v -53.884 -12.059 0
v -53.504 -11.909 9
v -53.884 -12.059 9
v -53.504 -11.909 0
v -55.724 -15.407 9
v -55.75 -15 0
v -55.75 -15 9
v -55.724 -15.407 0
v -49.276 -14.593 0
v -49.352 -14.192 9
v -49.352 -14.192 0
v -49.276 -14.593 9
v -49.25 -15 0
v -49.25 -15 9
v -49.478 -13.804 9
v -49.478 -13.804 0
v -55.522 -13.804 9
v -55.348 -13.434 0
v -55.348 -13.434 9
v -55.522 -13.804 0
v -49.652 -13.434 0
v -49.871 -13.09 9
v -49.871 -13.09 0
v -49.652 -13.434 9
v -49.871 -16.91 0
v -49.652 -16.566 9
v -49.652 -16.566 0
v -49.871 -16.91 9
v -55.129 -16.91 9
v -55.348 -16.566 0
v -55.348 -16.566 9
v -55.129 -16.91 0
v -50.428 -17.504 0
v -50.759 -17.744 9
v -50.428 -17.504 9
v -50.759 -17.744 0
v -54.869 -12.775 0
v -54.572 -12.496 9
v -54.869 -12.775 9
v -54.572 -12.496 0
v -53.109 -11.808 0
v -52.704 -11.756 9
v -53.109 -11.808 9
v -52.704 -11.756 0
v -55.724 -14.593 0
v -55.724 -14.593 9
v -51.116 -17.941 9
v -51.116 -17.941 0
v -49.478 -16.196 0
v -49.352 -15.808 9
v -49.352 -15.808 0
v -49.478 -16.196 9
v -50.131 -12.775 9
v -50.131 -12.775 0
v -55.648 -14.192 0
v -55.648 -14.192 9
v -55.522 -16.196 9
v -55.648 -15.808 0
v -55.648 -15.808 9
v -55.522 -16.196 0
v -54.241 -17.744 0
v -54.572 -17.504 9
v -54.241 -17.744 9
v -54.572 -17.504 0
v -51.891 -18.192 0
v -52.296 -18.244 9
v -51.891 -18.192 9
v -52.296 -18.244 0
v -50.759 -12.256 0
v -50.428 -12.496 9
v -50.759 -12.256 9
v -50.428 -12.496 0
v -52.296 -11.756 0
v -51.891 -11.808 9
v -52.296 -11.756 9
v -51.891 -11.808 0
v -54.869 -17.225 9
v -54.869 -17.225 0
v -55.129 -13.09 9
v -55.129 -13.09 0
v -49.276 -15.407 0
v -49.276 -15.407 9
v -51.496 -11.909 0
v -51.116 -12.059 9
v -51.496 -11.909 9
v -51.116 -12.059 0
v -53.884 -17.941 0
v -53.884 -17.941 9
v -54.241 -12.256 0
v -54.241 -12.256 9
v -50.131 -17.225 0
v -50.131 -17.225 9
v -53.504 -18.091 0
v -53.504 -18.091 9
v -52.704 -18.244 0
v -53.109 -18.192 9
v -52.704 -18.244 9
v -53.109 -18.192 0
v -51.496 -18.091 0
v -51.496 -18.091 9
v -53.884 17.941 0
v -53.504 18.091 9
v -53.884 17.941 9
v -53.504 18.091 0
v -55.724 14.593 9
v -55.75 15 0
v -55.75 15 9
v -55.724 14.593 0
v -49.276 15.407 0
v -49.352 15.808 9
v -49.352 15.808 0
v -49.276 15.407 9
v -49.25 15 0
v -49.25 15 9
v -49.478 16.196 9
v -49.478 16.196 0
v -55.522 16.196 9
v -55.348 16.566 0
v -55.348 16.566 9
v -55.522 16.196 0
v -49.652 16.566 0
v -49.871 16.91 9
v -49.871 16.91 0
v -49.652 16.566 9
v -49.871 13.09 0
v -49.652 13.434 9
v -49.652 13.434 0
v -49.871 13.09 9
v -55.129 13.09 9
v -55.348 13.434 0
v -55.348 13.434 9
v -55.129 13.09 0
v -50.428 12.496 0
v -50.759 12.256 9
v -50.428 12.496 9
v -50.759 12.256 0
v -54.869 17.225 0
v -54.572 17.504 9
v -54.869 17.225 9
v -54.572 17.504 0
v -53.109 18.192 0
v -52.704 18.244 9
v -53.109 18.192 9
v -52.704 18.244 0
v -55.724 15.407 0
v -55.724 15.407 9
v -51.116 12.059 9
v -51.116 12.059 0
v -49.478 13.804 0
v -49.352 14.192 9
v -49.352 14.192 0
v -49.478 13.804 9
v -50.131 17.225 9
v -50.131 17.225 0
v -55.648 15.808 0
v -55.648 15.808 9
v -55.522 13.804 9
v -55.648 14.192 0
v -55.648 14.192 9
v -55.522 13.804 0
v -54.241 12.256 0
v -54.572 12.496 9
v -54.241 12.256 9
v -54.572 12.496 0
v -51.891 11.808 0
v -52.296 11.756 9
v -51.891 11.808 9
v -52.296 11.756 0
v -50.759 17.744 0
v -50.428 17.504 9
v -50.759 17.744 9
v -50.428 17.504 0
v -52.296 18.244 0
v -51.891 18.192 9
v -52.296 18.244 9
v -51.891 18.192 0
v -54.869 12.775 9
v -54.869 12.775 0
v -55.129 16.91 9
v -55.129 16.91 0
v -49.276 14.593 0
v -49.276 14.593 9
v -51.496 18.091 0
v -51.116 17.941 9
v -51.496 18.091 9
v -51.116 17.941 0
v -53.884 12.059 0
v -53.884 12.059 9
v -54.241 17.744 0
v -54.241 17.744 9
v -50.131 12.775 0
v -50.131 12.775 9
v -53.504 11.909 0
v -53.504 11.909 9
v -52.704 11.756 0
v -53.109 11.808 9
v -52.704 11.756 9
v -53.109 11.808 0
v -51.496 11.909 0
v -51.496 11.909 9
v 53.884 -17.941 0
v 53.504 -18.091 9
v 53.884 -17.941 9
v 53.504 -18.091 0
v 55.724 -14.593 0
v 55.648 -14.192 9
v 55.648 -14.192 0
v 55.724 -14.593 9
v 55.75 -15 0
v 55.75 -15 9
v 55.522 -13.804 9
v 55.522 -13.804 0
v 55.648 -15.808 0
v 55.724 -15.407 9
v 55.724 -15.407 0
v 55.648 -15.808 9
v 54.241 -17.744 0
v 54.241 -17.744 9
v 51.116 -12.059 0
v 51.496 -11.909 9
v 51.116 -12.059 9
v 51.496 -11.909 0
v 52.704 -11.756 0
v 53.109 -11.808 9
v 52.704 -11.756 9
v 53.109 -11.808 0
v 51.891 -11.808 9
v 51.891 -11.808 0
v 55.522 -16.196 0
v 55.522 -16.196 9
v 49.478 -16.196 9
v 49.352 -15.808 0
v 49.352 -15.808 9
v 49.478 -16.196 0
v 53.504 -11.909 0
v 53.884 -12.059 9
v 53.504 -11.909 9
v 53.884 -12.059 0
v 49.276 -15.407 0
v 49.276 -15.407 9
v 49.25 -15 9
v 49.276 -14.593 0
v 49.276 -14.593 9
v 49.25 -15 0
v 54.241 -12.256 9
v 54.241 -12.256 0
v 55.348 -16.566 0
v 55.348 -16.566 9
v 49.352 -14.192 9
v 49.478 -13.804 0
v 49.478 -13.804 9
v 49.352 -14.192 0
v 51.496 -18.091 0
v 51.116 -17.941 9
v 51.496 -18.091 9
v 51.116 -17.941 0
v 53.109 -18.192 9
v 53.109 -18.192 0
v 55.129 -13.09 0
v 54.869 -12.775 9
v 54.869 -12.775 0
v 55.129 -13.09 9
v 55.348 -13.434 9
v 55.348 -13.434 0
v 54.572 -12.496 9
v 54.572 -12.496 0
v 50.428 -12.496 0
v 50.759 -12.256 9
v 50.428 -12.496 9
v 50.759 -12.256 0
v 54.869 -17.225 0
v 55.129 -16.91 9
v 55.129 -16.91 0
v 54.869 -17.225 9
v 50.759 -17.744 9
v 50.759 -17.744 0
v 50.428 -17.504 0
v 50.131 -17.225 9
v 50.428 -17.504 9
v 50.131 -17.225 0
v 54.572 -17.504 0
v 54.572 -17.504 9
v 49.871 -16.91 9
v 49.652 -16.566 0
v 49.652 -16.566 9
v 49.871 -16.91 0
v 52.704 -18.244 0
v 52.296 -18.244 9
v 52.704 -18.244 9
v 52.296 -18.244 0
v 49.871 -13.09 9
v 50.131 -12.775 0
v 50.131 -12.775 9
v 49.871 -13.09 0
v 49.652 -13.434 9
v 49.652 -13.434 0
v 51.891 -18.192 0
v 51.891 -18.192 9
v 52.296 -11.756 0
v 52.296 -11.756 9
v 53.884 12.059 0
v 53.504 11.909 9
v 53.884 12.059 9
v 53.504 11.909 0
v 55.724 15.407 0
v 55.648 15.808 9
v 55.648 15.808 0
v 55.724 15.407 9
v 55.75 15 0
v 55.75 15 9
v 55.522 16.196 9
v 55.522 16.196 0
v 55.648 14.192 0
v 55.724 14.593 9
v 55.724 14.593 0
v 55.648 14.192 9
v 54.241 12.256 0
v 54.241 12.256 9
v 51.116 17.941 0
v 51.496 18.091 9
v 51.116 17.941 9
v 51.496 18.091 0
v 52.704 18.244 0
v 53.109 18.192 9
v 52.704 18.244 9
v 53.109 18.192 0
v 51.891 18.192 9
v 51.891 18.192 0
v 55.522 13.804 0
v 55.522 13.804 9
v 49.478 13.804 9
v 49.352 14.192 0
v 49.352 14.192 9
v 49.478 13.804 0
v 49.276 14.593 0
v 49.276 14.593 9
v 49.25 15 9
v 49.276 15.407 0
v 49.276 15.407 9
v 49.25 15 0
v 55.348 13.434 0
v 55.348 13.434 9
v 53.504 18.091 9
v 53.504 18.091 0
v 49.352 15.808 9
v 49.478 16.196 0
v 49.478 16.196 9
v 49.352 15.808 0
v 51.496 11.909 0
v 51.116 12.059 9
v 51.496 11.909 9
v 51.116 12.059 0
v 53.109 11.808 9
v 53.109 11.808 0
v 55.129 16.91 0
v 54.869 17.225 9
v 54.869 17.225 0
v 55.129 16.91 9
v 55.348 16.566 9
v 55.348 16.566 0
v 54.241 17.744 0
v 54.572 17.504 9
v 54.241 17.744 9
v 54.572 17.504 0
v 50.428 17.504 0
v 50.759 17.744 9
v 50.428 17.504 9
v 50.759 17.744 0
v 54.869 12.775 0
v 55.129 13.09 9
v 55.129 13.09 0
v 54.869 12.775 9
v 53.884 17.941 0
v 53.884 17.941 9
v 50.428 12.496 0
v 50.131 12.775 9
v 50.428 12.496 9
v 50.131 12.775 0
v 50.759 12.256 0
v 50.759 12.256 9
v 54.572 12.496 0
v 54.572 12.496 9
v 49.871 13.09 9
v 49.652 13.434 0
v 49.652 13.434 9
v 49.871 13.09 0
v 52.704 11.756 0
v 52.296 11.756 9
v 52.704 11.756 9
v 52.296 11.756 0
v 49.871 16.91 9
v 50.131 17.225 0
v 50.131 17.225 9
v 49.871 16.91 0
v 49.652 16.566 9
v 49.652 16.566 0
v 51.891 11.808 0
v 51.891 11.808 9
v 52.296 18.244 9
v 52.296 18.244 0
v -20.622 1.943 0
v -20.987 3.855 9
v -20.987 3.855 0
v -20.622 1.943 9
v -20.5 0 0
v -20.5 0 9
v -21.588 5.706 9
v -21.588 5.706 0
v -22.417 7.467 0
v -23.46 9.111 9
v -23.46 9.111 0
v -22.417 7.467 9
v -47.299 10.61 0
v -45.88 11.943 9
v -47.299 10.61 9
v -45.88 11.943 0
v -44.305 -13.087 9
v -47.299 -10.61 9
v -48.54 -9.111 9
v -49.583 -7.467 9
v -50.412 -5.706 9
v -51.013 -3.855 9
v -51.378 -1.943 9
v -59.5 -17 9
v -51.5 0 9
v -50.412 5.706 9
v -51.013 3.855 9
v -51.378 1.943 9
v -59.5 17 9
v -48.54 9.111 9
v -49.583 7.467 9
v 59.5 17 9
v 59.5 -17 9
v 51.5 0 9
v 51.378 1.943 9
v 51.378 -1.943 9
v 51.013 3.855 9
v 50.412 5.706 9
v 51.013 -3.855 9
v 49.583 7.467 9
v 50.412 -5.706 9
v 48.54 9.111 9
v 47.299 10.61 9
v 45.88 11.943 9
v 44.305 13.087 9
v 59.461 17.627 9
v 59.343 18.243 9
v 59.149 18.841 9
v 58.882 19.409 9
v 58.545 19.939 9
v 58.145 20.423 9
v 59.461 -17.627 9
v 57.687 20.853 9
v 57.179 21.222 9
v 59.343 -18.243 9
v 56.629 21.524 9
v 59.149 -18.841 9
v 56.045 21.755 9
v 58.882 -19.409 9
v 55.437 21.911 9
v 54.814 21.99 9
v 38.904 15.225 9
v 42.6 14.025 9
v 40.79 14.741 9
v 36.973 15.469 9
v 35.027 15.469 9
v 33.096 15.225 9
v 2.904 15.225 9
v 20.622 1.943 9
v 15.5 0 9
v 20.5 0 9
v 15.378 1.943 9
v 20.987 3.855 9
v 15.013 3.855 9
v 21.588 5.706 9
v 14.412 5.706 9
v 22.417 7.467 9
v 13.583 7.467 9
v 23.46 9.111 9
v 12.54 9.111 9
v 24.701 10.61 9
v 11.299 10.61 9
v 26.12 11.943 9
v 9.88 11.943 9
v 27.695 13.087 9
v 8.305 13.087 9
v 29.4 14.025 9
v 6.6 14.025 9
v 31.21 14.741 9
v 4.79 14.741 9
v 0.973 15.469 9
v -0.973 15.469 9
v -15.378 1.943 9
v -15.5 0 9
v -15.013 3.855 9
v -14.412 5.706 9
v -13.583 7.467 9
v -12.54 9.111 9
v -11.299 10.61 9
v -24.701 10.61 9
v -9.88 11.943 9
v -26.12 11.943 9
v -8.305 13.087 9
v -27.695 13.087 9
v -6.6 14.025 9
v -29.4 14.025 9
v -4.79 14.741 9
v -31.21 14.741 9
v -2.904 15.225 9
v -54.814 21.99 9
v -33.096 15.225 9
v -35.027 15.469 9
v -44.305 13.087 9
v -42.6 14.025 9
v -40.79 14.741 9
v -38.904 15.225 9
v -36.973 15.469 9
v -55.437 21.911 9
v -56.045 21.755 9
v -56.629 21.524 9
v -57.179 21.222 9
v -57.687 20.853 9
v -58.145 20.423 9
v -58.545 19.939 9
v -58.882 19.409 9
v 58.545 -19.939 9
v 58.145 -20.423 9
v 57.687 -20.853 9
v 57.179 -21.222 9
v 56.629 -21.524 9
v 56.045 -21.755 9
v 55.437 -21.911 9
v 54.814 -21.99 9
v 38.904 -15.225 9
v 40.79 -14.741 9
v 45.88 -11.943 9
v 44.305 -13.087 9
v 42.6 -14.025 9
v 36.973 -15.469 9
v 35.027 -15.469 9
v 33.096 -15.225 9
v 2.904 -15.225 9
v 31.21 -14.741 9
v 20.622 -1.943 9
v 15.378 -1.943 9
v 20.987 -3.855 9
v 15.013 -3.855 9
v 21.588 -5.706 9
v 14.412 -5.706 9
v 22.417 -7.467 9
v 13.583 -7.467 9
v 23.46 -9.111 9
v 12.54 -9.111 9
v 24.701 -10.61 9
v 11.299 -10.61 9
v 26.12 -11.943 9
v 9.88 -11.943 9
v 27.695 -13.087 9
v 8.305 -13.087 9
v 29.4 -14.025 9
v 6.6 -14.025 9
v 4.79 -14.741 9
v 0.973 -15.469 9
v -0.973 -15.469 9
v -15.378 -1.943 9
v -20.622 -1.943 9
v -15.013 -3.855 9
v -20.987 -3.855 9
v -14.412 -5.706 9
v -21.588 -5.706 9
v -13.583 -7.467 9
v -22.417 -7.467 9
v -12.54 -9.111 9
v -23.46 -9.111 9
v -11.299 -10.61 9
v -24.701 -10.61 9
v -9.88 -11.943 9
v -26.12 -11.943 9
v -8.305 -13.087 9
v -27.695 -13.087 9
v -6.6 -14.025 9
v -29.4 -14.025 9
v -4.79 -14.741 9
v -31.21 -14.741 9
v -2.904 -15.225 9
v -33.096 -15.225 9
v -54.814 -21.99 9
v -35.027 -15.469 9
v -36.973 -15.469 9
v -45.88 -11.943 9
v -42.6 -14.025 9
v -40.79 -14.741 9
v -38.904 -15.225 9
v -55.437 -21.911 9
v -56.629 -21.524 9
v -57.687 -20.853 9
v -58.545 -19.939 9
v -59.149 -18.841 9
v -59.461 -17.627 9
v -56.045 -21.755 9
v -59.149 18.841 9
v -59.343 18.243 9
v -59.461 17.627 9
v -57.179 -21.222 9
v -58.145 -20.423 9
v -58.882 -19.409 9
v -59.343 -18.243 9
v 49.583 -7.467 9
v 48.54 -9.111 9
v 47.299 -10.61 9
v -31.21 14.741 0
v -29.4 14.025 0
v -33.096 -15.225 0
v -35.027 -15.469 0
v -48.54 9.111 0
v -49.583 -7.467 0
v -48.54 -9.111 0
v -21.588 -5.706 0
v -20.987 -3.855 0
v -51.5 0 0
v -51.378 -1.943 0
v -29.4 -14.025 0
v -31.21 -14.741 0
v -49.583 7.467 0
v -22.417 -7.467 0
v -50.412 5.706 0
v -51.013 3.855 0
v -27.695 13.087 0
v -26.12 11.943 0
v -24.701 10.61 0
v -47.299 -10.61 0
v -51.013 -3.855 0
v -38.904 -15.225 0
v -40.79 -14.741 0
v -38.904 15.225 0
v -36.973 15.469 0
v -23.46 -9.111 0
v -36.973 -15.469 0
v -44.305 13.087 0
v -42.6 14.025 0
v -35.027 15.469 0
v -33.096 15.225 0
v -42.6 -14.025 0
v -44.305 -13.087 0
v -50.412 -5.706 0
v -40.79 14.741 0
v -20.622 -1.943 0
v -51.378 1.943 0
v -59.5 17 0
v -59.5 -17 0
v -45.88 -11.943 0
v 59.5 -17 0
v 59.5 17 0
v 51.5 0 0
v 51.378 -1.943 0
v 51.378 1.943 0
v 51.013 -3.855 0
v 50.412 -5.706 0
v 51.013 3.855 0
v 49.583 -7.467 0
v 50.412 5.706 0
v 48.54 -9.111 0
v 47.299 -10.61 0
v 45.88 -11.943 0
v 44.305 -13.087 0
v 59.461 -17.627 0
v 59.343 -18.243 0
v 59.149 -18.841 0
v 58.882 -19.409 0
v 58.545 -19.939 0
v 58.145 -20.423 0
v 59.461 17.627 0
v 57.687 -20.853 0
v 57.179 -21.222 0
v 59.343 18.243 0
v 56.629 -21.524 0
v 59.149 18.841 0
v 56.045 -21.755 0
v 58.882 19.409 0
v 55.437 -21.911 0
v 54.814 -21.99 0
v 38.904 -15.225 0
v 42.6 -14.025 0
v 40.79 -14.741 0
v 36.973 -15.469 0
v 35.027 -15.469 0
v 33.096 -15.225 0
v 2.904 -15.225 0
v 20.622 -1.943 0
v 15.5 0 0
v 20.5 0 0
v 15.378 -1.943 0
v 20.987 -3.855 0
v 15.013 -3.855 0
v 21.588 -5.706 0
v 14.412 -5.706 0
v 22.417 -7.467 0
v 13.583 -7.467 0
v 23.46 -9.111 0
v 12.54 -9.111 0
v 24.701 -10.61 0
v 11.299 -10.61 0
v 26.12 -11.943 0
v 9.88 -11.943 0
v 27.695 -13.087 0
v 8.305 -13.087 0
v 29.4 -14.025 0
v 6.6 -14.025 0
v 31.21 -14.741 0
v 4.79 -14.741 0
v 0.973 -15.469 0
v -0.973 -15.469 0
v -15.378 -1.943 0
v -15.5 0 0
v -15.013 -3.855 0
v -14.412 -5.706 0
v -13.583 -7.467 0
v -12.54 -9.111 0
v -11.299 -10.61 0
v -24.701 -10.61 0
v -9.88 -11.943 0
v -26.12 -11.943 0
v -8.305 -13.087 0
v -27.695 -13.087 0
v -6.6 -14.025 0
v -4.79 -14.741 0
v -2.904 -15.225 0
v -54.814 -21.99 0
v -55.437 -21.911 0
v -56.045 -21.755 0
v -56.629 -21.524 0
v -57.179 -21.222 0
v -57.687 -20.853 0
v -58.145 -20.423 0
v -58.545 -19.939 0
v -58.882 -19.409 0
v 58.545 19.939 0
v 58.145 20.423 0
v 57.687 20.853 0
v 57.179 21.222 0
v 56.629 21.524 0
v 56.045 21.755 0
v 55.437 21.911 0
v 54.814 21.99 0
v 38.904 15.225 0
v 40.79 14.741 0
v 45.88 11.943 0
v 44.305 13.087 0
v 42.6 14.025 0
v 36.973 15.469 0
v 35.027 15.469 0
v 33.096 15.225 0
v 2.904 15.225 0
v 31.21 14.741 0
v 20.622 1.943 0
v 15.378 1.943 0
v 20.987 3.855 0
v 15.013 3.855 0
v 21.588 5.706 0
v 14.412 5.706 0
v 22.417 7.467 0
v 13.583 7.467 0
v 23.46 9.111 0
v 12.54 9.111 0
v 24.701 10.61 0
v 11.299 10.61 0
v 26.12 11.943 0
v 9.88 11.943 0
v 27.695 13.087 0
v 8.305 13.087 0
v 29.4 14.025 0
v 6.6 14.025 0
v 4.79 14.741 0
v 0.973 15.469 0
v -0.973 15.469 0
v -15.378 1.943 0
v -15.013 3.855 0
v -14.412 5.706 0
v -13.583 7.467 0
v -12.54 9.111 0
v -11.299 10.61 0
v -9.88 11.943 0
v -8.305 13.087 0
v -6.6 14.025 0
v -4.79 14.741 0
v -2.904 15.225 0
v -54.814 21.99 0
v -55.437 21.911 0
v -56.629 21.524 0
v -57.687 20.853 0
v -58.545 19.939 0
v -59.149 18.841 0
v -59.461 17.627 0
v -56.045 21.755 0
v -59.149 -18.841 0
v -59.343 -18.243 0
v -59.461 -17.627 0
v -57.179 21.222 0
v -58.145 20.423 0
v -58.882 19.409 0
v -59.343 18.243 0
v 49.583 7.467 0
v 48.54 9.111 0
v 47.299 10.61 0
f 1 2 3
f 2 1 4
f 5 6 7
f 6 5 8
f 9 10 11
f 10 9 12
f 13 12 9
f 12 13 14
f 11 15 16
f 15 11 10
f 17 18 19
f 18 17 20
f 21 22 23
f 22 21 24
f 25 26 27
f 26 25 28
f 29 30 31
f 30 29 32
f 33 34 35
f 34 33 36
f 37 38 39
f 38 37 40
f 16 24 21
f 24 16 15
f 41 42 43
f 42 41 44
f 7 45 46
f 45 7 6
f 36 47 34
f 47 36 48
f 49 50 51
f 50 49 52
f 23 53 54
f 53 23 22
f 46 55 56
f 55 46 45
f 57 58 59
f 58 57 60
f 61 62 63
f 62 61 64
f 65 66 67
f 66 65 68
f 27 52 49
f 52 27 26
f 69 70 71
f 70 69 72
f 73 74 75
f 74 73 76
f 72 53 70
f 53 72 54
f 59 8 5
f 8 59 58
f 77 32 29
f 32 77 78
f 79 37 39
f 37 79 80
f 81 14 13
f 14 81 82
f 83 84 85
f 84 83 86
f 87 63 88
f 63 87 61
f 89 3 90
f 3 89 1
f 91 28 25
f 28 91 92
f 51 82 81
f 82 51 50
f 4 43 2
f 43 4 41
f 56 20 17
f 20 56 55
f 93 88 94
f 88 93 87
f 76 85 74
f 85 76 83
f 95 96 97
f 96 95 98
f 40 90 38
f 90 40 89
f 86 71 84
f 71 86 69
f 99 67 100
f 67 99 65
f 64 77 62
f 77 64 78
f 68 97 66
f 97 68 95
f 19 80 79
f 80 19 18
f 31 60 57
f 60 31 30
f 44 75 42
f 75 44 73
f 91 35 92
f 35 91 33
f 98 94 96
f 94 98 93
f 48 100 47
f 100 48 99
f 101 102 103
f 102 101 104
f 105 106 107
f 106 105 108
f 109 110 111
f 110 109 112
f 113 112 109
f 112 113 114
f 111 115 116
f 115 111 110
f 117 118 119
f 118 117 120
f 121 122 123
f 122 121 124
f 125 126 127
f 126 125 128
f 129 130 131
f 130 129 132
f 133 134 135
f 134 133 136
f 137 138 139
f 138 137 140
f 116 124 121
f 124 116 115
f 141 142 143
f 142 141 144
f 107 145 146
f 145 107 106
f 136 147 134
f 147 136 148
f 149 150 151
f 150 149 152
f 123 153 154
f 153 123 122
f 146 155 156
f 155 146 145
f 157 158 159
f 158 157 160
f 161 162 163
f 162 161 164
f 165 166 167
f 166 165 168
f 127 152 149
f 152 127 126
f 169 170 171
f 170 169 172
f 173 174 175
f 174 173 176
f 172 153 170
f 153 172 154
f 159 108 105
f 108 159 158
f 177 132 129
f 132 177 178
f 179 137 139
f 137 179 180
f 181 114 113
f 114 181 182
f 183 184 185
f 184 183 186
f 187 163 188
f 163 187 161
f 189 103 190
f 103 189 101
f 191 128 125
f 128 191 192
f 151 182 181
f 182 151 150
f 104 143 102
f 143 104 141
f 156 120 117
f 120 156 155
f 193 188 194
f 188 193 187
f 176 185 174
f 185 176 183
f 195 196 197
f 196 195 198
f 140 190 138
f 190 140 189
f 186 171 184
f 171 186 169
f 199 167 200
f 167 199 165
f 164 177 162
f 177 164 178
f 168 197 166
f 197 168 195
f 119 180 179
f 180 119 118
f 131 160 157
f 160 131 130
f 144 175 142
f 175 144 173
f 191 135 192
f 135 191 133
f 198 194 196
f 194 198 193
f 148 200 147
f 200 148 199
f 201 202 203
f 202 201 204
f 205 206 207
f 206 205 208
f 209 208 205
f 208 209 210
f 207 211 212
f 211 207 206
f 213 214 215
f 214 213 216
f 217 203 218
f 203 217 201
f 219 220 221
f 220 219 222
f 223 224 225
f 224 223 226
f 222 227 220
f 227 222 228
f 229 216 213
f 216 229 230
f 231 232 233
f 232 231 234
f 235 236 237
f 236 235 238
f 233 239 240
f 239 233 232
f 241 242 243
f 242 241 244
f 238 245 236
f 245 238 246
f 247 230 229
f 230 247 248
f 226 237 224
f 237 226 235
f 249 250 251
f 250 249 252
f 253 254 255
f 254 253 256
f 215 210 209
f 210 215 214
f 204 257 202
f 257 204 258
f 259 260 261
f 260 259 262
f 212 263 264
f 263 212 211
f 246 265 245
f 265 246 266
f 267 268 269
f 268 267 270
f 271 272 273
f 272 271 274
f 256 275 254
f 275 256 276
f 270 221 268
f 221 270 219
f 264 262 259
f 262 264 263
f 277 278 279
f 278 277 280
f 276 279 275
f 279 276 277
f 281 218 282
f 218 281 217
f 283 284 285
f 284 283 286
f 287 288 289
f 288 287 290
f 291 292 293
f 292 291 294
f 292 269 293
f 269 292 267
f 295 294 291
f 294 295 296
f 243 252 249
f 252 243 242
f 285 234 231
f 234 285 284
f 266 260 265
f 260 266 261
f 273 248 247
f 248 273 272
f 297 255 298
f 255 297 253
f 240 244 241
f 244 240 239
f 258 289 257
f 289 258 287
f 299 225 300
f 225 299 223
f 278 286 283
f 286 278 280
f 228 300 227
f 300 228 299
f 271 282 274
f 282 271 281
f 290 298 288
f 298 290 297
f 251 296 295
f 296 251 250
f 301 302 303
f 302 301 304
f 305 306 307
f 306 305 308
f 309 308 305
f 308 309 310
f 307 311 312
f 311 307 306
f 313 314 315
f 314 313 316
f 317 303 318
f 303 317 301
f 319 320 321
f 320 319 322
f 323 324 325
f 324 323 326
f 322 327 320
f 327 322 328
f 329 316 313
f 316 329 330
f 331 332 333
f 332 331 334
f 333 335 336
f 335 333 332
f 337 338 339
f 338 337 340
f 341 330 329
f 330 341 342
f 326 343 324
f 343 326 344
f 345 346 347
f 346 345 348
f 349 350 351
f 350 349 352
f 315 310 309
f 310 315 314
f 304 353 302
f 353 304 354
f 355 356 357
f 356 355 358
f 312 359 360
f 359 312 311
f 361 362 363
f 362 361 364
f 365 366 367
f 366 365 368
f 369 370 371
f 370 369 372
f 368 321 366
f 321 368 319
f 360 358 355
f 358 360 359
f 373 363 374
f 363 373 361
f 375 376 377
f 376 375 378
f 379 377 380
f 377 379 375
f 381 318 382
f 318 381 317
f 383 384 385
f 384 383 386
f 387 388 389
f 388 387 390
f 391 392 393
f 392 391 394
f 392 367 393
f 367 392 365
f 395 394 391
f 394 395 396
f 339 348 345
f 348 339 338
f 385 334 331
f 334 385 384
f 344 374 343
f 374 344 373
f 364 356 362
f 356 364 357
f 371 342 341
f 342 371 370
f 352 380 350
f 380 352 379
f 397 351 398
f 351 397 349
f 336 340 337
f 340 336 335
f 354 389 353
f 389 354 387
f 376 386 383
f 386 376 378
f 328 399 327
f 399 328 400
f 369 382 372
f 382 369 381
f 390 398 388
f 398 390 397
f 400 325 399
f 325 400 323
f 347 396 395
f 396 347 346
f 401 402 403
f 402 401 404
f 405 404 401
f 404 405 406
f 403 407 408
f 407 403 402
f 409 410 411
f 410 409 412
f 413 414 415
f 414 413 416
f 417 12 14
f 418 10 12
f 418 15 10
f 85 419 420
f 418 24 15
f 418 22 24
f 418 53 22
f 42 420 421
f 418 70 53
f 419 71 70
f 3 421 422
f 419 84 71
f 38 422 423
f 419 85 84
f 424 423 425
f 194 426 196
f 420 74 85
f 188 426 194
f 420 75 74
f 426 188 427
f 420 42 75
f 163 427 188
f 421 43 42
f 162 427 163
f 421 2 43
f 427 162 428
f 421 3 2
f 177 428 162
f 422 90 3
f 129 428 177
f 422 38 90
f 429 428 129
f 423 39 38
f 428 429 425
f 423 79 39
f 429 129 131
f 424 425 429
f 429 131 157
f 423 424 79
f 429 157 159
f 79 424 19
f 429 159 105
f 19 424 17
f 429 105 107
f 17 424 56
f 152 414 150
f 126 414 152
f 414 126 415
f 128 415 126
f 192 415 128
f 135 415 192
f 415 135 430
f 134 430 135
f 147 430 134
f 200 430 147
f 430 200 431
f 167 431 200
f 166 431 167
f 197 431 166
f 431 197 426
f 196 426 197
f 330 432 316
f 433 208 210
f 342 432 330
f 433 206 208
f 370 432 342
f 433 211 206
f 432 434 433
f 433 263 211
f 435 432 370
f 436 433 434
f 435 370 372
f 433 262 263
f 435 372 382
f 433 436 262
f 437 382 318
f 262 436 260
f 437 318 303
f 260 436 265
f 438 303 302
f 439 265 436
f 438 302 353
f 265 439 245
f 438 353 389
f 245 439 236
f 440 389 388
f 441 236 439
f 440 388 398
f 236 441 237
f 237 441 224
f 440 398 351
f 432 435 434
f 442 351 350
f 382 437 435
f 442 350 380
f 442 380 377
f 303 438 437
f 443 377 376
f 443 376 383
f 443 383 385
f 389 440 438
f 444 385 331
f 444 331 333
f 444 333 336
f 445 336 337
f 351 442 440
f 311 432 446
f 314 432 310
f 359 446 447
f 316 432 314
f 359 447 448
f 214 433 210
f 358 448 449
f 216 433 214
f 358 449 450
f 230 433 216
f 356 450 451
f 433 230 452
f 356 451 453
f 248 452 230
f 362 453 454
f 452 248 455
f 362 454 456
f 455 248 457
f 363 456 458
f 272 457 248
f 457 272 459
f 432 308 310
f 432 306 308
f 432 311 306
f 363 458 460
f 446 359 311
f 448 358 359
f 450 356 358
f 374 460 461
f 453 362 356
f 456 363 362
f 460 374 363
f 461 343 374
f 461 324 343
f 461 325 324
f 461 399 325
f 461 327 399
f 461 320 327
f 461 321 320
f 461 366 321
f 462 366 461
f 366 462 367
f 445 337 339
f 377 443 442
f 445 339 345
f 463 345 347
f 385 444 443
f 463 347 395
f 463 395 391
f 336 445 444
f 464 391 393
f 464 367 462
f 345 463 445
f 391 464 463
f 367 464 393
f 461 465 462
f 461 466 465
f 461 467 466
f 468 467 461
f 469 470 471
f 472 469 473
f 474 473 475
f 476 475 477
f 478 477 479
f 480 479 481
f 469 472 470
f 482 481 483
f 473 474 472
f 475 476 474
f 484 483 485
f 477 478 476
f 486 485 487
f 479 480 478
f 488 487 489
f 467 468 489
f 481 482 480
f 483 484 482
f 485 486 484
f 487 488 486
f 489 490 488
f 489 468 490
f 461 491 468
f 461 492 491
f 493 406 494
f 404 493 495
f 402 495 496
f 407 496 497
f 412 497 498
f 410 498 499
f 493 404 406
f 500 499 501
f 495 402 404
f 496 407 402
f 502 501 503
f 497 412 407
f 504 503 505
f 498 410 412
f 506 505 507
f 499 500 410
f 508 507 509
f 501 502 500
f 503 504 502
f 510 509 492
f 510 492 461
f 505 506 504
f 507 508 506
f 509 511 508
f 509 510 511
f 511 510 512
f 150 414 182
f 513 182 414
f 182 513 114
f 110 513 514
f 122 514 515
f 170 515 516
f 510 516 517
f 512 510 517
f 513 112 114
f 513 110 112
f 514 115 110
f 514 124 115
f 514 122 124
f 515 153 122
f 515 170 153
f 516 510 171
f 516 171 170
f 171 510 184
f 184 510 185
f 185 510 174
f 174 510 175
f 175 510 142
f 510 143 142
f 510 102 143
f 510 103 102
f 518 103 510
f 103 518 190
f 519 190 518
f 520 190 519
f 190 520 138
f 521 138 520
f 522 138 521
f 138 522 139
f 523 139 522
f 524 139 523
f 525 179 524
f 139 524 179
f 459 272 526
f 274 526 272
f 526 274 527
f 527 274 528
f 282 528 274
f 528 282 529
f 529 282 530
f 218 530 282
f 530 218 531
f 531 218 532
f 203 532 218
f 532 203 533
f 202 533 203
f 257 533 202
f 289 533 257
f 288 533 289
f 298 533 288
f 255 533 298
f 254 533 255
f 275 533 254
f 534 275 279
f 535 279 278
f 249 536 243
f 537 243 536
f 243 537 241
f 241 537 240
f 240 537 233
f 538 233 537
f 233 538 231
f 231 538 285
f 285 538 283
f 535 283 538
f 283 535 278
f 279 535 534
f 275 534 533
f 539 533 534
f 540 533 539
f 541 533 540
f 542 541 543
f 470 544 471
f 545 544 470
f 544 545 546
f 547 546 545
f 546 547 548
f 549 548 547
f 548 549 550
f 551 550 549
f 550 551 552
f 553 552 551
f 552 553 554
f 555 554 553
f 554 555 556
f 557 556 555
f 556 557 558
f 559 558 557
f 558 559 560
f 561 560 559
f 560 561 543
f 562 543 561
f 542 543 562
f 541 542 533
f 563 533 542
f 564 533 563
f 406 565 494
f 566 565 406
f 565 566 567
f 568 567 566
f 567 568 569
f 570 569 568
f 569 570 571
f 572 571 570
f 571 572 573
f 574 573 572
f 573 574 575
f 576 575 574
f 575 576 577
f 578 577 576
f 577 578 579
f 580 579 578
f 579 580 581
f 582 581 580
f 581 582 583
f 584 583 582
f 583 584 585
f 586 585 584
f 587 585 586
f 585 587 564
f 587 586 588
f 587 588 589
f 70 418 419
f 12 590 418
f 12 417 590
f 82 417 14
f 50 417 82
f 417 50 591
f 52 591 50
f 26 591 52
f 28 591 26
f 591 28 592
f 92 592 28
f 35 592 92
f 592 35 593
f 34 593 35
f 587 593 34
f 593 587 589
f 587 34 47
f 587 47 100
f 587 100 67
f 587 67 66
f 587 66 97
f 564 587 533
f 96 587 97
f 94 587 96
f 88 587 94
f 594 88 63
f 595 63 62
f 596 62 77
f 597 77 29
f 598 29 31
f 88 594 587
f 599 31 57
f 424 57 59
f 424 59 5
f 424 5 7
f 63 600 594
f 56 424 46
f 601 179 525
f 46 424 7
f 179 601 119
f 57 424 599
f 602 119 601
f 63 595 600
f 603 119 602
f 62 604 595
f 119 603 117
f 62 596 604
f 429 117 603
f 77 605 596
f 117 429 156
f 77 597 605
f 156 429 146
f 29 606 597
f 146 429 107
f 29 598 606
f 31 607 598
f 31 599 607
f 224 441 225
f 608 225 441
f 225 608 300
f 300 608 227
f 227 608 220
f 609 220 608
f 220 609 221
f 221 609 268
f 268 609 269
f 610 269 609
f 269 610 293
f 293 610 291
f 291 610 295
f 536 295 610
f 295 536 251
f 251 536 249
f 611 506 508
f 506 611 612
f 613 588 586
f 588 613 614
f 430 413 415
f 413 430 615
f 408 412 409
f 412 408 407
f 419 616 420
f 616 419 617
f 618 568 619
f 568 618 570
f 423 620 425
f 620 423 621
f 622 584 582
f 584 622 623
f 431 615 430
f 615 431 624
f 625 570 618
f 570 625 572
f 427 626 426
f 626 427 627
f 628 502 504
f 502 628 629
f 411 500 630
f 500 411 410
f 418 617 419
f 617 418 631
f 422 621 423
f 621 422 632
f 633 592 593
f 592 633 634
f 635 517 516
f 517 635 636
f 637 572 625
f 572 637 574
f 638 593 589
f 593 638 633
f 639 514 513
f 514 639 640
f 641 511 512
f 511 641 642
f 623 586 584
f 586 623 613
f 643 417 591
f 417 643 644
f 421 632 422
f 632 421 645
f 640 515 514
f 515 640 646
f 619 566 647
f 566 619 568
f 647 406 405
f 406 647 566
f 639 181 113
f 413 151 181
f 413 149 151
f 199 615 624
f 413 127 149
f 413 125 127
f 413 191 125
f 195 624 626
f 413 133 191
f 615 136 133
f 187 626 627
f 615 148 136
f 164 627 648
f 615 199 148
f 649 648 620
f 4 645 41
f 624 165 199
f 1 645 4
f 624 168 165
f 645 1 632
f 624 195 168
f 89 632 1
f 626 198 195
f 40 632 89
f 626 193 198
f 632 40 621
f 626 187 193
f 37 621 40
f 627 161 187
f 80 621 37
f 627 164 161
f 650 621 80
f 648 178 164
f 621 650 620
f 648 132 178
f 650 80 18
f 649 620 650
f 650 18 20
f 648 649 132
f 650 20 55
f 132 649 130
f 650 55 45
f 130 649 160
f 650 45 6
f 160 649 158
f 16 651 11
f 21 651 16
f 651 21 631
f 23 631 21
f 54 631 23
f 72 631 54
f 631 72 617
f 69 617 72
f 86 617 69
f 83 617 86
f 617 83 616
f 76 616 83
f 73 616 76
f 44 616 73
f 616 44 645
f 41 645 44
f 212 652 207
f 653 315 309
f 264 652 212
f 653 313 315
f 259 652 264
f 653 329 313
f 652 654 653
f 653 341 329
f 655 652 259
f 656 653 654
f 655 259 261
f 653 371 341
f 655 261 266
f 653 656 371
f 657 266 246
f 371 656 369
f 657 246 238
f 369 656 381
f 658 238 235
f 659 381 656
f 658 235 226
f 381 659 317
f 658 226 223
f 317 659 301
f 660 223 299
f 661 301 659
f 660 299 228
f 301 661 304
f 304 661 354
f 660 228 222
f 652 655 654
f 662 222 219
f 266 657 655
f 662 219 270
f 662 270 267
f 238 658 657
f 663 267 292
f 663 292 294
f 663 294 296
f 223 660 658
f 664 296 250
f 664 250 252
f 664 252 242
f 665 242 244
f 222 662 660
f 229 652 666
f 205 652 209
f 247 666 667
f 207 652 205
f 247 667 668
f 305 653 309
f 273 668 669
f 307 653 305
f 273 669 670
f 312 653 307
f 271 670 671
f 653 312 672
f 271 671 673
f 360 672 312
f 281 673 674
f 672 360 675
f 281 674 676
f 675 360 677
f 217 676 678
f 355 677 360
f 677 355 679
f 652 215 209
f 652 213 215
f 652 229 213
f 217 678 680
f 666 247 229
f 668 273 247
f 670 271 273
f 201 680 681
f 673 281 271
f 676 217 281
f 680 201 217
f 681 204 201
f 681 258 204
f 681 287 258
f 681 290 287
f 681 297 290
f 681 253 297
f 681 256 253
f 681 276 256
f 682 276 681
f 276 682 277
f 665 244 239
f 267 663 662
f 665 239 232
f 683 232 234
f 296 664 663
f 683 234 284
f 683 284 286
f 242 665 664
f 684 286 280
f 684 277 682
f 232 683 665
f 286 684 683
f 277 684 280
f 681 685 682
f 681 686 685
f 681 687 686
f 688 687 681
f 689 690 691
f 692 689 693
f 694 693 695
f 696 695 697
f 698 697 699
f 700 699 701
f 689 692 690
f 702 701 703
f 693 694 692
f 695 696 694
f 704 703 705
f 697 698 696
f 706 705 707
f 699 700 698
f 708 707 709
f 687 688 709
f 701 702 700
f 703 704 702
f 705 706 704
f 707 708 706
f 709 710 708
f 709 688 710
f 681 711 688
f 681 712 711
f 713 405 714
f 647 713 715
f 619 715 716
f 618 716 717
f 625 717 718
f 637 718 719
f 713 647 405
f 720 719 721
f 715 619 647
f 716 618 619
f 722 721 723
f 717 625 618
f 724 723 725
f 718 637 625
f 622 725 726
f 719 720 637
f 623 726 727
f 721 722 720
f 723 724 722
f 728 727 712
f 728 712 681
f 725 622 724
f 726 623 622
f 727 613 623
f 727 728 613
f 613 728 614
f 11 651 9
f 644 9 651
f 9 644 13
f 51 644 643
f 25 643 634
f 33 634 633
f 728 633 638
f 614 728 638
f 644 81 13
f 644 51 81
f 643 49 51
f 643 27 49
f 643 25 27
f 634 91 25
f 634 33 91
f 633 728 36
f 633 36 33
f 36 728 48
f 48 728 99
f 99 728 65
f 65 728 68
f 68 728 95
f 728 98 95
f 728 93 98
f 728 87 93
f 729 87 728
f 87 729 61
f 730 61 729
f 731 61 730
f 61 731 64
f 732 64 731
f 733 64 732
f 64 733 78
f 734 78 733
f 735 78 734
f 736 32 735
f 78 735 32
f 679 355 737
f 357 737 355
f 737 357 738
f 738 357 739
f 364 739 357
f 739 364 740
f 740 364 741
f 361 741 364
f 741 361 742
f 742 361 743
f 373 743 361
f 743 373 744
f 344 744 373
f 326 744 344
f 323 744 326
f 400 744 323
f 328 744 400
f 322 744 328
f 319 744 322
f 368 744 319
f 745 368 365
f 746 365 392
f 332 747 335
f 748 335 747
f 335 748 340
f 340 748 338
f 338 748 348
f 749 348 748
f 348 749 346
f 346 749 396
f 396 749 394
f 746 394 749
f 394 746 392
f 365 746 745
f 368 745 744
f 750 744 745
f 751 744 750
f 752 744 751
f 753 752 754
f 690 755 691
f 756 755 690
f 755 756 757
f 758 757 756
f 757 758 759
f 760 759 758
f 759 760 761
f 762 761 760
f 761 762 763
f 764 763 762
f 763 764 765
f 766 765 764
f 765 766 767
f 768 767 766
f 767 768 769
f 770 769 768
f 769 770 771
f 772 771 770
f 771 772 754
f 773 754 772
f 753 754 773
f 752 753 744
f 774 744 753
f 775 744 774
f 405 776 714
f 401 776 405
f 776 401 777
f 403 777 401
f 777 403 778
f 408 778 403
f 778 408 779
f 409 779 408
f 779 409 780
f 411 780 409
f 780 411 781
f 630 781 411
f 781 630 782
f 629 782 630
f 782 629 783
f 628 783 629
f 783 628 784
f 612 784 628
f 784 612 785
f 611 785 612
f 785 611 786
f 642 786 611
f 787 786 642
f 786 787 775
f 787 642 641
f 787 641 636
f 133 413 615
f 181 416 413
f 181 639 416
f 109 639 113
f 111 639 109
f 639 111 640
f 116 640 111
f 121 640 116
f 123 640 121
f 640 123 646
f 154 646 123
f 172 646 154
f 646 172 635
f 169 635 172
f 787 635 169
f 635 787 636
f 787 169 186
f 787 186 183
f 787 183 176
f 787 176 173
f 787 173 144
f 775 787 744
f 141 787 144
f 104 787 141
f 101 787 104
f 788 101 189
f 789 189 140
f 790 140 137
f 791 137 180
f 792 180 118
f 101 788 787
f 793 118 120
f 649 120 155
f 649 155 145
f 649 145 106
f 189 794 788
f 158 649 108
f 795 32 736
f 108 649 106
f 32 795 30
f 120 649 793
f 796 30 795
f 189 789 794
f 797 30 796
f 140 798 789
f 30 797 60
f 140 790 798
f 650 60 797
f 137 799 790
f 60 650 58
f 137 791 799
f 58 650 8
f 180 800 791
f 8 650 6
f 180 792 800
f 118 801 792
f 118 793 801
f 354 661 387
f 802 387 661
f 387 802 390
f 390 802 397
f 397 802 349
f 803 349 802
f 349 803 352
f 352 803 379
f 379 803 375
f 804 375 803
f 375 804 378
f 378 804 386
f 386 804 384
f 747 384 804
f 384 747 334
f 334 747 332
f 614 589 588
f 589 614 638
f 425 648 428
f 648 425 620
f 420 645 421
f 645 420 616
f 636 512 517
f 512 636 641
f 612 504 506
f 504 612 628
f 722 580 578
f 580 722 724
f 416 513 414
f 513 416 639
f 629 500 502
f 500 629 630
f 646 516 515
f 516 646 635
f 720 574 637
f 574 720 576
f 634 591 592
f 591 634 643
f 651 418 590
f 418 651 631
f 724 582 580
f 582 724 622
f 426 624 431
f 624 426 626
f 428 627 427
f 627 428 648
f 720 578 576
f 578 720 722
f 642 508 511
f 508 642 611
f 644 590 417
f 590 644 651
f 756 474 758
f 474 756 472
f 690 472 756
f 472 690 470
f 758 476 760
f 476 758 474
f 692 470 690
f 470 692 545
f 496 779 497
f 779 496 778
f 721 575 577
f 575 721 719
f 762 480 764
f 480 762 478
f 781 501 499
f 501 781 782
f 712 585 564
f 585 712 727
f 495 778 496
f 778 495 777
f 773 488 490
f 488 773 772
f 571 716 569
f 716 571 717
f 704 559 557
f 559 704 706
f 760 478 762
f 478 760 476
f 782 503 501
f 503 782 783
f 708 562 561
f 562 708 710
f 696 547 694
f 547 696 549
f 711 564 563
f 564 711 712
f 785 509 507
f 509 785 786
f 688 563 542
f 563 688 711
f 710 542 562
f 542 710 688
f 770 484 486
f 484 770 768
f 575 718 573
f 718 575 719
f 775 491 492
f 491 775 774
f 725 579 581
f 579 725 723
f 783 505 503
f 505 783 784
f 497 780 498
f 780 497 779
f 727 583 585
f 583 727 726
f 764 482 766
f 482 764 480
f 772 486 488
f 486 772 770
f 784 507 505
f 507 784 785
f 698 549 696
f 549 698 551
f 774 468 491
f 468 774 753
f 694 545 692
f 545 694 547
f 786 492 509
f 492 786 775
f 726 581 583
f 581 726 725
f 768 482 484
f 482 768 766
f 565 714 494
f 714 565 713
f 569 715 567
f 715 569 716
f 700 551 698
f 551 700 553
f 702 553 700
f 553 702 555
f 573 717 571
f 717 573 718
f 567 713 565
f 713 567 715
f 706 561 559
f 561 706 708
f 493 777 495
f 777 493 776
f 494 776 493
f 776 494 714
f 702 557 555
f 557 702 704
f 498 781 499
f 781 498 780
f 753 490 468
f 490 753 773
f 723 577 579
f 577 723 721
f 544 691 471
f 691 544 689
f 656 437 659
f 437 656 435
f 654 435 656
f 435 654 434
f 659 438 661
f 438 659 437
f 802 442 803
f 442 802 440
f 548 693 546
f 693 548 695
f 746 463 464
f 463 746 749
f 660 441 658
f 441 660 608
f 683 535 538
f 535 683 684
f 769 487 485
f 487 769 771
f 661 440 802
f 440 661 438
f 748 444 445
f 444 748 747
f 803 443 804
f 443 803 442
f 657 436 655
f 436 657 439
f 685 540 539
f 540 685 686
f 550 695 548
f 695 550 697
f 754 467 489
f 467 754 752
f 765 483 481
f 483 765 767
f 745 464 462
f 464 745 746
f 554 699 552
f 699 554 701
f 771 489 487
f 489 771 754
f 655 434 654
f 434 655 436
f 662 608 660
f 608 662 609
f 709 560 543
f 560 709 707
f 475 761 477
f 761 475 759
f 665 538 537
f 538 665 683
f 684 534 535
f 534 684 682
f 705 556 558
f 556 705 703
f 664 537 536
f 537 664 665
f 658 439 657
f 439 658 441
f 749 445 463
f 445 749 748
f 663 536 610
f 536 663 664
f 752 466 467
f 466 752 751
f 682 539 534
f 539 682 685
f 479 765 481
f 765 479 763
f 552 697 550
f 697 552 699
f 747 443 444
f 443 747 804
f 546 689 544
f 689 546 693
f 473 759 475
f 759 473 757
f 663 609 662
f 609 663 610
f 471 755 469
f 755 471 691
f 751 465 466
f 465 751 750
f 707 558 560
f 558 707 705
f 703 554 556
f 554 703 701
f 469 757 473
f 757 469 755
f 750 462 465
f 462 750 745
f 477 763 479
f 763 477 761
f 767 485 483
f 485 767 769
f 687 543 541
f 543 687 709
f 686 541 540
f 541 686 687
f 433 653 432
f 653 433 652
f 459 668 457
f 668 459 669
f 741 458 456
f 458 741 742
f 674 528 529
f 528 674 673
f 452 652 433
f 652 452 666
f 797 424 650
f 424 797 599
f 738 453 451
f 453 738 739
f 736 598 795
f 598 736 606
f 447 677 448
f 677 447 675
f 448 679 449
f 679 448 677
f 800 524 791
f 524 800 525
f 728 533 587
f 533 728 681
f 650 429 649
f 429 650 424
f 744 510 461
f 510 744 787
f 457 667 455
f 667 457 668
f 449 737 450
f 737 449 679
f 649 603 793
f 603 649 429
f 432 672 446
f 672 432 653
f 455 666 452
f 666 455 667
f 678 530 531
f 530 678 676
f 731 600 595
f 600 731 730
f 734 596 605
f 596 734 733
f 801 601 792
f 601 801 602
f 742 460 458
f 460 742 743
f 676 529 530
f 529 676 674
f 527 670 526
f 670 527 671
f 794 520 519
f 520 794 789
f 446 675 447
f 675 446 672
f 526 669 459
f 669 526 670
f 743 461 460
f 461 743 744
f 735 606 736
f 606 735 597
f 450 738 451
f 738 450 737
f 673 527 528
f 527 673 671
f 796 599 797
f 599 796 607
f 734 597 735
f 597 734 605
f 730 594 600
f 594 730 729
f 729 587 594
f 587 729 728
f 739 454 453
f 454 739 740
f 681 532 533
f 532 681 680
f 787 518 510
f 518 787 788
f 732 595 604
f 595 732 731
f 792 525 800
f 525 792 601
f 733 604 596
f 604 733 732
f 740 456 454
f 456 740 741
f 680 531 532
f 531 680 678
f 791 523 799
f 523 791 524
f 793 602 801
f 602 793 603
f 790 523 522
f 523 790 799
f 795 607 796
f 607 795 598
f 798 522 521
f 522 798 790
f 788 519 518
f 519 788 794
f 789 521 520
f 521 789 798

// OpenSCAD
$fn = 50;

difference() {
	union() {
		hull() {
			translate(v = [-54.5, 17.0, 0]) {
				cylinder(h = 9, r = 5);
			}
			translate(v = [54.5, 17.0, 0]) {
				cylinder(h = 9, r = 5);
			}
			translate(v = [-54.5, -17.0, 0]) {
				cylinder(h = 9, r = 5);
			}
			translate(v = [54.5, -17.0, 0]) {
				cylinder(h = 9, r = 5);
			}
		}
	}
	union() {
		translate(v = [-52.5, -15.0, -100.0]) {
			cylinder(h = 200, r = 3.25);
		}
		translate(v = [-52.5, 15.0, -100.0]) {
			cylinder(h = 200, r = 3.25);
		}
		translate(v = [52.5, -15.0, -100.0]) {
			cylinder(h = 200, r = 3.25);
		}
		translate(v = [52.5, 15.0, -100.0]) {
			cylinder(h = 200, r = 3.25);
		}
		translate(v = [-52.5, -15.0, -100.0]) {
			cylinder(h = 200, r = 1.8);
		}
		translate(v = [-52.5, 15.0, -100.0]) {
			cylinder(h = 200, r = 1.8);
		}
		translate(v = [52.5, -15.0, -100.0]) {
			cylinder(h = 200, r = 1.8);
		}
		translate(v = [52.5, 15.0, -100.0]) {
			cylinder(h = 200, r = 1.8);
		}
		translate(v = [-36.0, 0, 0.0]) {
			cylinder(h = 9, r = 15.5);
		}
		cylinder(h = 9, r = 15.5);
		translate(v = [36.0, 0, 0.0]) {
			cylinder(h = 9, r = 15.5);
		}
	}
}
